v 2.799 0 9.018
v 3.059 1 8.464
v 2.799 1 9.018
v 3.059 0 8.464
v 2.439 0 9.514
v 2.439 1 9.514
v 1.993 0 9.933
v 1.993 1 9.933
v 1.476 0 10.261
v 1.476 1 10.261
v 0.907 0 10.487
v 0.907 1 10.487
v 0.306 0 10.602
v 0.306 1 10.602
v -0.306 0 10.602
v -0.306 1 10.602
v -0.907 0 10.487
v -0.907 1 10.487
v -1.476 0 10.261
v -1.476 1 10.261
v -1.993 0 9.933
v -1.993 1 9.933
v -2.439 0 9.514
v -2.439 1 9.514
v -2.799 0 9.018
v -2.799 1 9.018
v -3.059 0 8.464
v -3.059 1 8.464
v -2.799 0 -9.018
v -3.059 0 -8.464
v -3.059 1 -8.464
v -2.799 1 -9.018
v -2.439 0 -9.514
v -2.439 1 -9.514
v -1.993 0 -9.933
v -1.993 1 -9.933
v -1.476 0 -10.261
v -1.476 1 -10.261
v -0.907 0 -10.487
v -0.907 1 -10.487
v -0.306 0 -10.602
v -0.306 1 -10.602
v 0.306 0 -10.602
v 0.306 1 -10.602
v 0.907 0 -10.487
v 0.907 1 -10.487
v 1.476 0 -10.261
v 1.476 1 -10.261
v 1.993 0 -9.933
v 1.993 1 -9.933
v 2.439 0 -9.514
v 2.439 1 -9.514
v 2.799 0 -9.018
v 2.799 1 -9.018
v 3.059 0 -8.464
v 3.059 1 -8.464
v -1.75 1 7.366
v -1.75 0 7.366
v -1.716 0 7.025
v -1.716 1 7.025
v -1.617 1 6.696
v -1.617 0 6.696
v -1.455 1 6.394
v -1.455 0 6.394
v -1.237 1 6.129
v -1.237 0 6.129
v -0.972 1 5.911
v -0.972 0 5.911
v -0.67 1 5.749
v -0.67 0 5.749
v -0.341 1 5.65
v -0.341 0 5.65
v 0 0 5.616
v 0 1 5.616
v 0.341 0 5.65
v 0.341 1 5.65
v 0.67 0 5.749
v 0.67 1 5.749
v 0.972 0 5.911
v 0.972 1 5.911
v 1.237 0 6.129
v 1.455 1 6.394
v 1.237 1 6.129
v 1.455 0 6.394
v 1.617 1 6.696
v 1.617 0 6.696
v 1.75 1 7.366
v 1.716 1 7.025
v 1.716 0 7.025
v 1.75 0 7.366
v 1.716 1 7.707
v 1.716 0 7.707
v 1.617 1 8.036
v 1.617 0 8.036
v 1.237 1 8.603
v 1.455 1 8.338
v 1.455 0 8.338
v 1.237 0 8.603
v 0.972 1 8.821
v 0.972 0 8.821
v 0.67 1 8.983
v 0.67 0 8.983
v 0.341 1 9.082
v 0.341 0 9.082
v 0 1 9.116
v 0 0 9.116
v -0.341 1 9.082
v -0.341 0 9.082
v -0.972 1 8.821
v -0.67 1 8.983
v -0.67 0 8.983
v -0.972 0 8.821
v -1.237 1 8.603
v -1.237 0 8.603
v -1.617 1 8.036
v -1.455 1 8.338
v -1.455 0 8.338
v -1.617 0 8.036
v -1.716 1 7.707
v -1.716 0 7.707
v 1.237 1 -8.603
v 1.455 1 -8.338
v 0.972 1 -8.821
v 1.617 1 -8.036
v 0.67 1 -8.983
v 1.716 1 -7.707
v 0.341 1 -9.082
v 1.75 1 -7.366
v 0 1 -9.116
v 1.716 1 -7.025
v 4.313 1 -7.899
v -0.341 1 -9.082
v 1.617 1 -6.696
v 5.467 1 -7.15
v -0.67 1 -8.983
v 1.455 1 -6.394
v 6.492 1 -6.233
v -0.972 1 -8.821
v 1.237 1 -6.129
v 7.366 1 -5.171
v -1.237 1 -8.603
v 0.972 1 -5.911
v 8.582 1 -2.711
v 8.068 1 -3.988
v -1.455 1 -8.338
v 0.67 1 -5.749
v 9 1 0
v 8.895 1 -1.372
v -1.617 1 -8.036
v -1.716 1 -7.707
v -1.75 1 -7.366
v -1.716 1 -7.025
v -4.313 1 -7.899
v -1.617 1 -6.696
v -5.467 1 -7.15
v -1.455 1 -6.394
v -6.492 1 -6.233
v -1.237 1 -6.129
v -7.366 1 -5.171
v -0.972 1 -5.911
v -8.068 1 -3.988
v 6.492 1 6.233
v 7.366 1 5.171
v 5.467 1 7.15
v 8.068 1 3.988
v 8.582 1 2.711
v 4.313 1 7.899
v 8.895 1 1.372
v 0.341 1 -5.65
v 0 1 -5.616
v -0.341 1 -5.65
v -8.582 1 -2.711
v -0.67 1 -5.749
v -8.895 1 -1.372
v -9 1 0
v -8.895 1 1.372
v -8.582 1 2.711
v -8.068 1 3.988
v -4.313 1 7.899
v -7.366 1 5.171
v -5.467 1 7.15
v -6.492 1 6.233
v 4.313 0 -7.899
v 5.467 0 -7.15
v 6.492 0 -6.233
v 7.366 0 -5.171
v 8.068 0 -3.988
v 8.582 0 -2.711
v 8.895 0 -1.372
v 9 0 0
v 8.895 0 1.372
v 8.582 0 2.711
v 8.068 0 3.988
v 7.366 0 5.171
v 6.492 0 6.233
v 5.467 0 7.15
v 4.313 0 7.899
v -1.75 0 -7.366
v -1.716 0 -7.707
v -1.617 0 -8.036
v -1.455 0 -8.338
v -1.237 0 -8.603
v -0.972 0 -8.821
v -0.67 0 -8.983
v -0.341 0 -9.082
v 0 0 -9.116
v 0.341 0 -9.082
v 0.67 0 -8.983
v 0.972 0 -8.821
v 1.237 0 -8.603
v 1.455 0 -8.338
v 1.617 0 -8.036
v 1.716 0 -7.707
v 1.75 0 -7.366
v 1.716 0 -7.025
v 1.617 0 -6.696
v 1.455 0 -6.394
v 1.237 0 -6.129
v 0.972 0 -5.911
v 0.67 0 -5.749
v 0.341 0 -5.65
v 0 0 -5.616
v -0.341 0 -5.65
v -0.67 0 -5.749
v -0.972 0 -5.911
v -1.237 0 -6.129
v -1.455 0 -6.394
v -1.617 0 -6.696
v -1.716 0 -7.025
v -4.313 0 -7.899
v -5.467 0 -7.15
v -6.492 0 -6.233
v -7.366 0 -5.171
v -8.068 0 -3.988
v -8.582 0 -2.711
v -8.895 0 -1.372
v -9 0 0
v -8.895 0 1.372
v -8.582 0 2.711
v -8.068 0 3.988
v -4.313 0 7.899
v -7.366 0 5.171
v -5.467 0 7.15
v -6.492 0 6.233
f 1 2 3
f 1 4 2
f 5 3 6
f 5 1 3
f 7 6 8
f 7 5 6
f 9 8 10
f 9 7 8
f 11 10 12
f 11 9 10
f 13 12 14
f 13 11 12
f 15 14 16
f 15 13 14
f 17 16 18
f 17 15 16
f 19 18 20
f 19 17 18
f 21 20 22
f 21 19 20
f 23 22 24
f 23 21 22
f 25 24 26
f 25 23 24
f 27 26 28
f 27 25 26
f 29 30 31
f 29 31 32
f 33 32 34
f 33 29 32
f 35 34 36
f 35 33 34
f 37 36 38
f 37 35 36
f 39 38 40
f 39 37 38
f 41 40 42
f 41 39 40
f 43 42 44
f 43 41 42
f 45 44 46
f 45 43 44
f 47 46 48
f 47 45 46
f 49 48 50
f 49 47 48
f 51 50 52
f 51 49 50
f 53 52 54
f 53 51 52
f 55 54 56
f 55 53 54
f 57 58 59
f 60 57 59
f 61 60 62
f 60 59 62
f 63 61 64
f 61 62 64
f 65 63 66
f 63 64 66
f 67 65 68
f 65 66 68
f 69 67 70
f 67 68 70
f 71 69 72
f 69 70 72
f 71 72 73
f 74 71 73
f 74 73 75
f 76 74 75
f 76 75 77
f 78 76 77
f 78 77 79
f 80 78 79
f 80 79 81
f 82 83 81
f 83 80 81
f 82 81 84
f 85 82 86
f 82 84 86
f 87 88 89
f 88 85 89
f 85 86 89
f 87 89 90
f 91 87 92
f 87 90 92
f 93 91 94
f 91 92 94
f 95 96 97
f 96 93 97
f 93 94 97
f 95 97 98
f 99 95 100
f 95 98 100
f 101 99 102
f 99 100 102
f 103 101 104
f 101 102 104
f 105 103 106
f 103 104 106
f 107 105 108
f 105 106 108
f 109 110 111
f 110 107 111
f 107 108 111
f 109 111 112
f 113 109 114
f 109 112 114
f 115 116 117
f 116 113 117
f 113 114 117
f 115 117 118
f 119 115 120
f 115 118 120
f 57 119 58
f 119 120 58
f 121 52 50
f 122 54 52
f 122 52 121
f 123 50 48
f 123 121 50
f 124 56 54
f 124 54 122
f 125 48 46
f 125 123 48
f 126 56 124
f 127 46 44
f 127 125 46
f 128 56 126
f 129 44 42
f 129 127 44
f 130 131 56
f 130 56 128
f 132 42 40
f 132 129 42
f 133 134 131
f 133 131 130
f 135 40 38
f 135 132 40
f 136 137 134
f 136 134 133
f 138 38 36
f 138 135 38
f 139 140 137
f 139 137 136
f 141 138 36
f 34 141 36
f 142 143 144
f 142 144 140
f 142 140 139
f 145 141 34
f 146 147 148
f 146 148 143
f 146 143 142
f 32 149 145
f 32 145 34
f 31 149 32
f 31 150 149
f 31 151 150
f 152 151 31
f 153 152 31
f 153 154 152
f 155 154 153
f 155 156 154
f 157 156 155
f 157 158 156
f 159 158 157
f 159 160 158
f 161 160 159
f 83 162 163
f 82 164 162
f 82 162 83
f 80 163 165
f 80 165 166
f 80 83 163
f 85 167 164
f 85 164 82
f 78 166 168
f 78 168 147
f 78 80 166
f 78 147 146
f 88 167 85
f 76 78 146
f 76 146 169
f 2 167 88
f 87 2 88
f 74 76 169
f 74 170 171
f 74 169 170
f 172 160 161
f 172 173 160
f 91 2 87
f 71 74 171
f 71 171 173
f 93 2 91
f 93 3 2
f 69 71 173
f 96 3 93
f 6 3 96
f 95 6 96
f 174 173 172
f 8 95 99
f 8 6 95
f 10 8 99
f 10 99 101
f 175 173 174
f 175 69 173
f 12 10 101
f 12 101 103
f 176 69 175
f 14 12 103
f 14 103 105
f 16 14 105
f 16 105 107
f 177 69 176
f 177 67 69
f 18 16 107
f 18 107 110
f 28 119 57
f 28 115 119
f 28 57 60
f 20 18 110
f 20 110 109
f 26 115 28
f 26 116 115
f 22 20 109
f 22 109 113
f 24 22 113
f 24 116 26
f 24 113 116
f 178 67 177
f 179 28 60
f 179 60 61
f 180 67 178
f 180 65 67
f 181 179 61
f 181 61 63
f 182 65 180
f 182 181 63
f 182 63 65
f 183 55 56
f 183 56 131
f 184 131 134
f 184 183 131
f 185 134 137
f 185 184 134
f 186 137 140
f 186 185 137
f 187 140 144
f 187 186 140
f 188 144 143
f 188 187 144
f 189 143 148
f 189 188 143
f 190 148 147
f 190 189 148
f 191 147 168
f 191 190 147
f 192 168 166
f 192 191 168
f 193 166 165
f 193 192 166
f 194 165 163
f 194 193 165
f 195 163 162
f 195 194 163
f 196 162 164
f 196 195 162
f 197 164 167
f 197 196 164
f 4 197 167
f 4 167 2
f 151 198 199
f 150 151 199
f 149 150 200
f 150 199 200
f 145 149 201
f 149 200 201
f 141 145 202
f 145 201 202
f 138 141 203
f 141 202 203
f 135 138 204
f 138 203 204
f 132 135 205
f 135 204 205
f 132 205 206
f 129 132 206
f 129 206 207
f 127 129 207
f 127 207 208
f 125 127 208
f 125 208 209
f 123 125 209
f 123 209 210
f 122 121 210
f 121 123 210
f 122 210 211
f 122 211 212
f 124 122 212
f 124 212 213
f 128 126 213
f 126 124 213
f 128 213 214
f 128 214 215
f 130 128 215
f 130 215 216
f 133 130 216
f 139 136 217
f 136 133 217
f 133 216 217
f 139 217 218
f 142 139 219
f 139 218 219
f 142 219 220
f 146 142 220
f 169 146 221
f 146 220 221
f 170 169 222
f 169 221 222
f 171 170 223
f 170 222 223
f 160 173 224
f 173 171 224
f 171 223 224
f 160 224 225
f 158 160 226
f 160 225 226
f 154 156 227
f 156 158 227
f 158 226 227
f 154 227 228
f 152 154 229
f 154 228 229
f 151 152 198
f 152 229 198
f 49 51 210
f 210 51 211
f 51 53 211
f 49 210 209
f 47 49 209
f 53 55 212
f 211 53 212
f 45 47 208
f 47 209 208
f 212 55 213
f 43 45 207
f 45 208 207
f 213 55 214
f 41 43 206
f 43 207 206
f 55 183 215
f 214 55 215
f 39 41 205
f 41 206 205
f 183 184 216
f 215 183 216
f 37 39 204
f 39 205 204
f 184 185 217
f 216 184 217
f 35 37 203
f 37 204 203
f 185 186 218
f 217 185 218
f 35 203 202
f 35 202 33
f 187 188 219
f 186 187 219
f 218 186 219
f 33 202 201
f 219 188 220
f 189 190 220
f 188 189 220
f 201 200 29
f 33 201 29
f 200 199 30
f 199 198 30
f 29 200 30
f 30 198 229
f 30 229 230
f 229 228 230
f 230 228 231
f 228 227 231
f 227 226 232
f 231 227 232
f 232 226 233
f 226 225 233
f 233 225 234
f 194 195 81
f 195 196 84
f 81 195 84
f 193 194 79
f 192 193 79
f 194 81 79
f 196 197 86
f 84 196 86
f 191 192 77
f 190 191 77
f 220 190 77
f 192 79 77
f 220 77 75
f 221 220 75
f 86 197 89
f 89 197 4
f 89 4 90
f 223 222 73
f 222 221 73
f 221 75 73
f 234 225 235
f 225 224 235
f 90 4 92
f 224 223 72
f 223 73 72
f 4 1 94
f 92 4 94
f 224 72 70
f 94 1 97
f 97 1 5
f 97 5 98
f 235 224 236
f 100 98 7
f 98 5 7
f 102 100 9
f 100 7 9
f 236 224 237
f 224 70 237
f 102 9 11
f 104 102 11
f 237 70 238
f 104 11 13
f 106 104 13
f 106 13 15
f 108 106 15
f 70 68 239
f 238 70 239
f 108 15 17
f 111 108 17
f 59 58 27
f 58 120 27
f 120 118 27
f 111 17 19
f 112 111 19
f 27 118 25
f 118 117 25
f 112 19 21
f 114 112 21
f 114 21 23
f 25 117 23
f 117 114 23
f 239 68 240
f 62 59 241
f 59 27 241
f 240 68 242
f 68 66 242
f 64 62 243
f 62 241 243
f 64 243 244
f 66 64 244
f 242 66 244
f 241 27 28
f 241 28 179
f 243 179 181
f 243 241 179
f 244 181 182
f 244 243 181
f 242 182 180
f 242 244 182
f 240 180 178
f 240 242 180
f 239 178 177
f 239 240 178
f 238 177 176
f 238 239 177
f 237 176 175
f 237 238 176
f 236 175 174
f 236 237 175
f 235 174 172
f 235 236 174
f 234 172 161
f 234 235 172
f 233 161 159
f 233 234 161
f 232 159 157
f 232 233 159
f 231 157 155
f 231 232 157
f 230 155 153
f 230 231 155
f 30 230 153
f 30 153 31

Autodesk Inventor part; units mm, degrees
ref_plane "YZ Plane" through (0, 0, 0) normal (1, 0, 0) x (0, 1, 0)
ref_plane "XZ Plane" through (0, 0, 0) normal (0, 1, 0) x (-1, 0, 0)
ref_plane "XY Plane" through (0, 0, 0) normal (0, 0, 1) x (1, 0, 0)
sketch "Sketch1" plane through (0, 0, 0) normal (0, 1, 0) x (-1, 0, 0)
  circle A0 centre (0, 7.366) radius 1.75
  circle A1 centre (0, -7.366) radius 1.75
  arc A2 (3.0588, -8.4643) -> (3.0588, 8.4643) centre (0, 0) ccw
  arc A3 (-3.0588, 8.4643) -> (-3.0588, -8.4643) centre (0, 0) ccw
  arc A4 (3.0588, 8.4643) -> (-3.0588, 8.4643) centre (0, 7.366) ccw
  arc A5 (-3.0588, -8.4643) -> (3.0588, -8.4643) centre (0, -7.366) ccw
  point P0 (9, 0)
extrude "Extrusion1" add sketch "Sketch1" along normal blind 1
properties part number "Ball Caster Spacer"
